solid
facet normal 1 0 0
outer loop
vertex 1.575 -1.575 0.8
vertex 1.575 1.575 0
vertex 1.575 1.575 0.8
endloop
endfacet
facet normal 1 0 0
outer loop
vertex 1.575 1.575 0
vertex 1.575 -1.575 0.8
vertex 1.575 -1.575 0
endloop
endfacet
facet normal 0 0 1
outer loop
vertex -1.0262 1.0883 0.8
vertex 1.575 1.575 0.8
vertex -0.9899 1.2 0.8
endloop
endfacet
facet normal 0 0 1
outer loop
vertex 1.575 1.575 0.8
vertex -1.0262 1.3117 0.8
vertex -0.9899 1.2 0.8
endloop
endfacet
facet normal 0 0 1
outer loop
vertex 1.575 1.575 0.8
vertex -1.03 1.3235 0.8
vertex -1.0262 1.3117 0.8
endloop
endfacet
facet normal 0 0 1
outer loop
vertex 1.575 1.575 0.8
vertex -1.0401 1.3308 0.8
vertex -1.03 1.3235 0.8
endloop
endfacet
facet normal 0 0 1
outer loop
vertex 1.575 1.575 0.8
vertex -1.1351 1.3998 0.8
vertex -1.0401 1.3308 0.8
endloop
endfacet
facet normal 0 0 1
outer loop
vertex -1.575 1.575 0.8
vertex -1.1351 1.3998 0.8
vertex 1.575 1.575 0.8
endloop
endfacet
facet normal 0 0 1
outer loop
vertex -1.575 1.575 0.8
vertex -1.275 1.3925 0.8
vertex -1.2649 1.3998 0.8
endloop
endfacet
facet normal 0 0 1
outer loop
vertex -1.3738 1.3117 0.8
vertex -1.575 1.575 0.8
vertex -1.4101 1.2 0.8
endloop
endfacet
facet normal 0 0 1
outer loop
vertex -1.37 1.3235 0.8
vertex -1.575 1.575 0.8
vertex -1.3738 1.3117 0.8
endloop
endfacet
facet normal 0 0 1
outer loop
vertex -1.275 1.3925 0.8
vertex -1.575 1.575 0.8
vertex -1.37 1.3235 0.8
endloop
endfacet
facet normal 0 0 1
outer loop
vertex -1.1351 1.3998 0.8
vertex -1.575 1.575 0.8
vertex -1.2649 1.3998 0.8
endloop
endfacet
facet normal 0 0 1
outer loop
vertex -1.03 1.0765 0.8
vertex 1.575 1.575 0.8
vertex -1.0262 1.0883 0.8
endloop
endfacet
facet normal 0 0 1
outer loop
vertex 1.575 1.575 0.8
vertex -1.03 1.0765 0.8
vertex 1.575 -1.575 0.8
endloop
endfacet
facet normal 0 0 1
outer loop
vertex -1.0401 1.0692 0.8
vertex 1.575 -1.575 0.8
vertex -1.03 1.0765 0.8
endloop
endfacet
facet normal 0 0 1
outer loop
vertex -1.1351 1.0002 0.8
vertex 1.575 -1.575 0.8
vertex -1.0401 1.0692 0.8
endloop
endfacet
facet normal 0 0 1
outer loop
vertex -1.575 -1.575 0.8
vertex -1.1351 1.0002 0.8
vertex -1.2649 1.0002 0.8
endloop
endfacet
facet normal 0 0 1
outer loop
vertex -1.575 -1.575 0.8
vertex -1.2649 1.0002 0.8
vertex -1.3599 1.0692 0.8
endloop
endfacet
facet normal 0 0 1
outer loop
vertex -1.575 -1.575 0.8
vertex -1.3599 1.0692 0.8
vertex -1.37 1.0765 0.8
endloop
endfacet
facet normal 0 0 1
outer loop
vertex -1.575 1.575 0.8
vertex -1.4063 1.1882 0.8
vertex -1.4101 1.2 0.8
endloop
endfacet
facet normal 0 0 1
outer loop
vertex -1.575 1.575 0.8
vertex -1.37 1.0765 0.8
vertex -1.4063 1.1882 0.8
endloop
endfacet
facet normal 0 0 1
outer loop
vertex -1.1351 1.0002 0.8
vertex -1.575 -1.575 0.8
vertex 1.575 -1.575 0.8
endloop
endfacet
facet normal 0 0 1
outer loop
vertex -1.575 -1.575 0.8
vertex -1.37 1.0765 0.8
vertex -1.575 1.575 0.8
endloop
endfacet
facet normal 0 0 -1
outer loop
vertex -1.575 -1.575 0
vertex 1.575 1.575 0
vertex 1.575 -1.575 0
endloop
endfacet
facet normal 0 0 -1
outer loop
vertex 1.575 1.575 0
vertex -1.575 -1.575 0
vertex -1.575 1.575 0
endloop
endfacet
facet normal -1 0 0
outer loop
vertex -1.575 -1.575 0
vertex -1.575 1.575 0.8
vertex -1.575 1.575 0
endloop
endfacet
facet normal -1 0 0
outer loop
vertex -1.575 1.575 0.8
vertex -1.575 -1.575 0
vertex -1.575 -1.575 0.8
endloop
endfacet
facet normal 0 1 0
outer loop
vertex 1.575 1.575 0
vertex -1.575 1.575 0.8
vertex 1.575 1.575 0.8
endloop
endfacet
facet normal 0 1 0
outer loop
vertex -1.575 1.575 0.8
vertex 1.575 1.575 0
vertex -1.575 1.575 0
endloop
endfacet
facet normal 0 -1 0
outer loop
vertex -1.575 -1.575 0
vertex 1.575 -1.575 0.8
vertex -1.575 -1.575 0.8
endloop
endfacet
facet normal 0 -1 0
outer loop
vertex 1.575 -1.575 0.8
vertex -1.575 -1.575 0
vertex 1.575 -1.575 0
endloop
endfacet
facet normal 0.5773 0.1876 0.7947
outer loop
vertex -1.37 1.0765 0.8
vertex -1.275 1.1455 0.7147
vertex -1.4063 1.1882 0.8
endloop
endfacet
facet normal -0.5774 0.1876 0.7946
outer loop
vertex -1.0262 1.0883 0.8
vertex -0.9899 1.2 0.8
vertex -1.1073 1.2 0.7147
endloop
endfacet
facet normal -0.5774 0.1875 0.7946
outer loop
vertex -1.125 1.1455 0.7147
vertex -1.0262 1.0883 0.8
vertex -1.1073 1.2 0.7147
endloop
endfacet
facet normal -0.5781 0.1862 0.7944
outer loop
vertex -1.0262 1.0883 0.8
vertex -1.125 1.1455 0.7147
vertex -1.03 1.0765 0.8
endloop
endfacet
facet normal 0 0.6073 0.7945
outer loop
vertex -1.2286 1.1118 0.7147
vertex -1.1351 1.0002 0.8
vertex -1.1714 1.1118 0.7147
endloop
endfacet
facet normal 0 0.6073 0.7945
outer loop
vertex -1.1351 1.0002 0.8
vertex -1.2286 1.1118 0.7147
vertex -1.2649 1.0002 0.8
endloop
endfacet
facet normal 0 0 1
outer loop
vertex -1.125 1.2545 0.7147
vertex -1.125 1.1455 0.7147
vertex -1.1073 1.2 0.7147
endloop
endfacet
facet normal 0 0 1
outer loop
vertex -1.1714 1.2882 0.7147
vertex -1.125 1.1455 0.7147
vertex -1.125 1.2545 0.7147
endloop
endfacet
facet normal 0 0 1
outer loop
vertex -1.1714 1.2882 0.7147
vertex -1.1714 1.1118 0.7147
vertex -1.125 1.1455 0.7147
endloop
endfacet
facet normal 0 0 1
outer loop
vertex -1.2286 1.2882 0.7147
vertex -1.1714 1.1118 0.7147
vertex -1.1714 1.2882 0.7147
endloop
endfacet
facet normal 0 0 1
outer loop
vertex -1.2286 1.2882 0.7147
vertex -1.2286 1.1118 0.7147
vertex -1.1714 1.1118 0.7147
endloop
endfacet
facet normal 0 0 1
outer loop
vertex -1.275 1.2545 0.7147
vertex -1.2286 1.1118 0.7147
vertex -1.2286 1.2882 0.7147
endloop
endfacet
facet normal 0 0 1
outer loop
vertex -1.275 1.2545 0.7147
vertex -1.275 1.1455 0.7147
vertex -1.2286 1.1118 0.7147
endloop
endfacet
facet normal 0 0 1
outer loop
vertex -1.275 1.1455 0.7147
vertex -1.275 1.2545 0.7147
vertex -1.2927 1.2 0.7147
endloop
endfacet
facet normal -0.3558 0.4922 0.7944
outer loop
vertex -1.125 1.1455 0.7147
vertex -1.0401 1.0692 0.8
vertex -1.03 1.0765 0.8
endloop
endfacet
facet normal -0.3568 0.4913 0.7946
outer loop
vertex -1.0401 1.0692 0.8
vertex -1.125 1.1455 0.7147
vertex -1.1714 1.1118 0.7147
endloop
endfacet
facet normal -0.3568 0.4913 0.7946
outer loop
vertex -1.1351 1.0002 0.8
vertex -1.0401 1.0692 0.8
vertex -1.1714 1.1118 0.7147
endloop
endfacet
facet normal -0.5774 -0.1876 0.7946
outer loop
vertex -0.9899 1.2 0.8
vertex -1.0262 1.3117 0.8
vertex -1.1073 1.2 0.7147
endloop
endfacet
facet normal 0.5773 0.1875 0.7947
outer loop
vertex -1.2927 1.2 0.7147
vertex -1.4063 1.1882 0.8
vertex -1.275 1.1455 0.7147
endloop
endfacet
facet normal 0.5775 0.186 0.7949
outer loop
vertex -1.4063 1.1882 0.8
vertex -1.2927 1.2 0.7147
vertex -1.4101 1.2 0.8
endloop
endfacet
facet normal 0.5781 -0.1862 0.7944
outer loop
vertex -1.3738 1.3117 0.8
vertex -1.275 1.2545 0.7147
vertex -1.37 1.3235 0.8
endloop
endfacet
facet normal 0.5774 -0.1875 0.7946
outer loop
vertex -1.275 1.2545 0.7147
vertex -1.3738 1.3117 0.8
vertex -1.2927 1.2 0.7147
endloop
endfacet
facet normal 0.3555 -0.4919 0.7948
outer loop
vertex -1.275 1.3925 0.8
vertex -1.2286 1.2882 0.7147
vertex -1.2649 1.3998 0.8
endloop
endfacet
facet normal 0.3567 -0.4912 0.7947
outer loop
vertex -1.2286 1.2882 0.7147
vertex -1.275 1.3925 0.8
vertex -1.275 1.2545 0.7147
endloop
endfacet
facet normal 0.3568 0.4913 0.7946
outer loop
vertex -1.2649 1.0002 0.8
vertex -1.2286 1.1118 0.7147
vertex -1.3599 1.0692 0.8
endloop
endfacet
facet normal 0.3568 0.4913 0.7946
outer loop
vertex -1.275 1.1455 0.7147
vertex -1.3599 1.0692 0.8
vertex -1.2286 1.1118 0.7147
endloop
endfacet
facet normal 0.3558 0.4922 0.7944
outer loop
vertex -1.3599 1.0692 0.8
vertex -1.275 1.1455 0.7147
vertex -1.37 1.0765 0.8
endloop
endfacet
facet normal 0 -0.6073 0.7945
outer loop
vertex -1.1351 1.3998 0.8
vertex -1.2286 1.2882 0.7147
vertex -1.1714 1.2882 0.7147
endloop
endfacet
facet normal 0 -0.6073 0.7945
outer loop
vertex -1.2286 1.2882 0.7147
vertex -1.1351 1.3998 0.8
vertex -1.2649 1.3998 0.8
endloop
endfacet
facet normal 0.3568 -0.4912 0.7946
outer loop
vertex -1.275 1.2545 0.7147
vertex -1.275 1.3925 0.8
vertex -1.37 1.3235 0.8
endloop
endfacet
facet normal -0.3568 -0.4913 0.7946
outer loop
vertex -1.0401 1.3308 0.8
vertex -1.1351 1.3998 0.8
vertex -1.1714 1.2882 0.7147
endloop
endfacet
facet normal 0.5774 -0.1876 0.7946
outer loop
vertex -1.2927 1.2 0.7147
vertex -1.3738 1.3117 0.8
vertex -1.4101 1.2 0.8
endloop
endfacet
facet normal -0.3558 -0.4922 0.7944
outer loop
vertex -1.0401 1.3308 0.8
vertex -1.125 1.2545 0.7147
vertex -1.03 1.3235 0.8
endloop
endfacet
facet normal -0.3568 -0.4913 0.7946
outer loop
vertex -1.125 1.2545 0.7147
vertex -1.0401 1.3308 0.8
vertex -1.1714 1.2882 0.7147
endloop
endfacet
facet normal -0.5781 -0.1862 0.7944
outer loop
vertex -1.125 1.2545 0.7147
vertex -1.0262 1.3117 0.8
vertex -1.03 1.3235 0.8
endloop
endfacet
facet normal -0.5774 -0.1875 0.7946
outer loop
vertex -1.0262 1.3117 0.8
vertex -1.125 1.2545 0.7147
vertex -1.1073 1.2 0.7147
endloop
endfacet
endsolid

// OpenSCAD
/*
 * Creates the SON-10 package
 *
 * Author: Ian McInerney
 * Created: October 11, 2013
 */

// Create the chip
translate([0.0,0.0,0.4])difference() {
	// The main chip body
	cube(size=[3.15,3.15,0.8], center=true);

	// The bump to indicate pin 1
	translate([-1.2,1.2,0.60])sphere(r=0.3, center=true, $fn=10);
}
